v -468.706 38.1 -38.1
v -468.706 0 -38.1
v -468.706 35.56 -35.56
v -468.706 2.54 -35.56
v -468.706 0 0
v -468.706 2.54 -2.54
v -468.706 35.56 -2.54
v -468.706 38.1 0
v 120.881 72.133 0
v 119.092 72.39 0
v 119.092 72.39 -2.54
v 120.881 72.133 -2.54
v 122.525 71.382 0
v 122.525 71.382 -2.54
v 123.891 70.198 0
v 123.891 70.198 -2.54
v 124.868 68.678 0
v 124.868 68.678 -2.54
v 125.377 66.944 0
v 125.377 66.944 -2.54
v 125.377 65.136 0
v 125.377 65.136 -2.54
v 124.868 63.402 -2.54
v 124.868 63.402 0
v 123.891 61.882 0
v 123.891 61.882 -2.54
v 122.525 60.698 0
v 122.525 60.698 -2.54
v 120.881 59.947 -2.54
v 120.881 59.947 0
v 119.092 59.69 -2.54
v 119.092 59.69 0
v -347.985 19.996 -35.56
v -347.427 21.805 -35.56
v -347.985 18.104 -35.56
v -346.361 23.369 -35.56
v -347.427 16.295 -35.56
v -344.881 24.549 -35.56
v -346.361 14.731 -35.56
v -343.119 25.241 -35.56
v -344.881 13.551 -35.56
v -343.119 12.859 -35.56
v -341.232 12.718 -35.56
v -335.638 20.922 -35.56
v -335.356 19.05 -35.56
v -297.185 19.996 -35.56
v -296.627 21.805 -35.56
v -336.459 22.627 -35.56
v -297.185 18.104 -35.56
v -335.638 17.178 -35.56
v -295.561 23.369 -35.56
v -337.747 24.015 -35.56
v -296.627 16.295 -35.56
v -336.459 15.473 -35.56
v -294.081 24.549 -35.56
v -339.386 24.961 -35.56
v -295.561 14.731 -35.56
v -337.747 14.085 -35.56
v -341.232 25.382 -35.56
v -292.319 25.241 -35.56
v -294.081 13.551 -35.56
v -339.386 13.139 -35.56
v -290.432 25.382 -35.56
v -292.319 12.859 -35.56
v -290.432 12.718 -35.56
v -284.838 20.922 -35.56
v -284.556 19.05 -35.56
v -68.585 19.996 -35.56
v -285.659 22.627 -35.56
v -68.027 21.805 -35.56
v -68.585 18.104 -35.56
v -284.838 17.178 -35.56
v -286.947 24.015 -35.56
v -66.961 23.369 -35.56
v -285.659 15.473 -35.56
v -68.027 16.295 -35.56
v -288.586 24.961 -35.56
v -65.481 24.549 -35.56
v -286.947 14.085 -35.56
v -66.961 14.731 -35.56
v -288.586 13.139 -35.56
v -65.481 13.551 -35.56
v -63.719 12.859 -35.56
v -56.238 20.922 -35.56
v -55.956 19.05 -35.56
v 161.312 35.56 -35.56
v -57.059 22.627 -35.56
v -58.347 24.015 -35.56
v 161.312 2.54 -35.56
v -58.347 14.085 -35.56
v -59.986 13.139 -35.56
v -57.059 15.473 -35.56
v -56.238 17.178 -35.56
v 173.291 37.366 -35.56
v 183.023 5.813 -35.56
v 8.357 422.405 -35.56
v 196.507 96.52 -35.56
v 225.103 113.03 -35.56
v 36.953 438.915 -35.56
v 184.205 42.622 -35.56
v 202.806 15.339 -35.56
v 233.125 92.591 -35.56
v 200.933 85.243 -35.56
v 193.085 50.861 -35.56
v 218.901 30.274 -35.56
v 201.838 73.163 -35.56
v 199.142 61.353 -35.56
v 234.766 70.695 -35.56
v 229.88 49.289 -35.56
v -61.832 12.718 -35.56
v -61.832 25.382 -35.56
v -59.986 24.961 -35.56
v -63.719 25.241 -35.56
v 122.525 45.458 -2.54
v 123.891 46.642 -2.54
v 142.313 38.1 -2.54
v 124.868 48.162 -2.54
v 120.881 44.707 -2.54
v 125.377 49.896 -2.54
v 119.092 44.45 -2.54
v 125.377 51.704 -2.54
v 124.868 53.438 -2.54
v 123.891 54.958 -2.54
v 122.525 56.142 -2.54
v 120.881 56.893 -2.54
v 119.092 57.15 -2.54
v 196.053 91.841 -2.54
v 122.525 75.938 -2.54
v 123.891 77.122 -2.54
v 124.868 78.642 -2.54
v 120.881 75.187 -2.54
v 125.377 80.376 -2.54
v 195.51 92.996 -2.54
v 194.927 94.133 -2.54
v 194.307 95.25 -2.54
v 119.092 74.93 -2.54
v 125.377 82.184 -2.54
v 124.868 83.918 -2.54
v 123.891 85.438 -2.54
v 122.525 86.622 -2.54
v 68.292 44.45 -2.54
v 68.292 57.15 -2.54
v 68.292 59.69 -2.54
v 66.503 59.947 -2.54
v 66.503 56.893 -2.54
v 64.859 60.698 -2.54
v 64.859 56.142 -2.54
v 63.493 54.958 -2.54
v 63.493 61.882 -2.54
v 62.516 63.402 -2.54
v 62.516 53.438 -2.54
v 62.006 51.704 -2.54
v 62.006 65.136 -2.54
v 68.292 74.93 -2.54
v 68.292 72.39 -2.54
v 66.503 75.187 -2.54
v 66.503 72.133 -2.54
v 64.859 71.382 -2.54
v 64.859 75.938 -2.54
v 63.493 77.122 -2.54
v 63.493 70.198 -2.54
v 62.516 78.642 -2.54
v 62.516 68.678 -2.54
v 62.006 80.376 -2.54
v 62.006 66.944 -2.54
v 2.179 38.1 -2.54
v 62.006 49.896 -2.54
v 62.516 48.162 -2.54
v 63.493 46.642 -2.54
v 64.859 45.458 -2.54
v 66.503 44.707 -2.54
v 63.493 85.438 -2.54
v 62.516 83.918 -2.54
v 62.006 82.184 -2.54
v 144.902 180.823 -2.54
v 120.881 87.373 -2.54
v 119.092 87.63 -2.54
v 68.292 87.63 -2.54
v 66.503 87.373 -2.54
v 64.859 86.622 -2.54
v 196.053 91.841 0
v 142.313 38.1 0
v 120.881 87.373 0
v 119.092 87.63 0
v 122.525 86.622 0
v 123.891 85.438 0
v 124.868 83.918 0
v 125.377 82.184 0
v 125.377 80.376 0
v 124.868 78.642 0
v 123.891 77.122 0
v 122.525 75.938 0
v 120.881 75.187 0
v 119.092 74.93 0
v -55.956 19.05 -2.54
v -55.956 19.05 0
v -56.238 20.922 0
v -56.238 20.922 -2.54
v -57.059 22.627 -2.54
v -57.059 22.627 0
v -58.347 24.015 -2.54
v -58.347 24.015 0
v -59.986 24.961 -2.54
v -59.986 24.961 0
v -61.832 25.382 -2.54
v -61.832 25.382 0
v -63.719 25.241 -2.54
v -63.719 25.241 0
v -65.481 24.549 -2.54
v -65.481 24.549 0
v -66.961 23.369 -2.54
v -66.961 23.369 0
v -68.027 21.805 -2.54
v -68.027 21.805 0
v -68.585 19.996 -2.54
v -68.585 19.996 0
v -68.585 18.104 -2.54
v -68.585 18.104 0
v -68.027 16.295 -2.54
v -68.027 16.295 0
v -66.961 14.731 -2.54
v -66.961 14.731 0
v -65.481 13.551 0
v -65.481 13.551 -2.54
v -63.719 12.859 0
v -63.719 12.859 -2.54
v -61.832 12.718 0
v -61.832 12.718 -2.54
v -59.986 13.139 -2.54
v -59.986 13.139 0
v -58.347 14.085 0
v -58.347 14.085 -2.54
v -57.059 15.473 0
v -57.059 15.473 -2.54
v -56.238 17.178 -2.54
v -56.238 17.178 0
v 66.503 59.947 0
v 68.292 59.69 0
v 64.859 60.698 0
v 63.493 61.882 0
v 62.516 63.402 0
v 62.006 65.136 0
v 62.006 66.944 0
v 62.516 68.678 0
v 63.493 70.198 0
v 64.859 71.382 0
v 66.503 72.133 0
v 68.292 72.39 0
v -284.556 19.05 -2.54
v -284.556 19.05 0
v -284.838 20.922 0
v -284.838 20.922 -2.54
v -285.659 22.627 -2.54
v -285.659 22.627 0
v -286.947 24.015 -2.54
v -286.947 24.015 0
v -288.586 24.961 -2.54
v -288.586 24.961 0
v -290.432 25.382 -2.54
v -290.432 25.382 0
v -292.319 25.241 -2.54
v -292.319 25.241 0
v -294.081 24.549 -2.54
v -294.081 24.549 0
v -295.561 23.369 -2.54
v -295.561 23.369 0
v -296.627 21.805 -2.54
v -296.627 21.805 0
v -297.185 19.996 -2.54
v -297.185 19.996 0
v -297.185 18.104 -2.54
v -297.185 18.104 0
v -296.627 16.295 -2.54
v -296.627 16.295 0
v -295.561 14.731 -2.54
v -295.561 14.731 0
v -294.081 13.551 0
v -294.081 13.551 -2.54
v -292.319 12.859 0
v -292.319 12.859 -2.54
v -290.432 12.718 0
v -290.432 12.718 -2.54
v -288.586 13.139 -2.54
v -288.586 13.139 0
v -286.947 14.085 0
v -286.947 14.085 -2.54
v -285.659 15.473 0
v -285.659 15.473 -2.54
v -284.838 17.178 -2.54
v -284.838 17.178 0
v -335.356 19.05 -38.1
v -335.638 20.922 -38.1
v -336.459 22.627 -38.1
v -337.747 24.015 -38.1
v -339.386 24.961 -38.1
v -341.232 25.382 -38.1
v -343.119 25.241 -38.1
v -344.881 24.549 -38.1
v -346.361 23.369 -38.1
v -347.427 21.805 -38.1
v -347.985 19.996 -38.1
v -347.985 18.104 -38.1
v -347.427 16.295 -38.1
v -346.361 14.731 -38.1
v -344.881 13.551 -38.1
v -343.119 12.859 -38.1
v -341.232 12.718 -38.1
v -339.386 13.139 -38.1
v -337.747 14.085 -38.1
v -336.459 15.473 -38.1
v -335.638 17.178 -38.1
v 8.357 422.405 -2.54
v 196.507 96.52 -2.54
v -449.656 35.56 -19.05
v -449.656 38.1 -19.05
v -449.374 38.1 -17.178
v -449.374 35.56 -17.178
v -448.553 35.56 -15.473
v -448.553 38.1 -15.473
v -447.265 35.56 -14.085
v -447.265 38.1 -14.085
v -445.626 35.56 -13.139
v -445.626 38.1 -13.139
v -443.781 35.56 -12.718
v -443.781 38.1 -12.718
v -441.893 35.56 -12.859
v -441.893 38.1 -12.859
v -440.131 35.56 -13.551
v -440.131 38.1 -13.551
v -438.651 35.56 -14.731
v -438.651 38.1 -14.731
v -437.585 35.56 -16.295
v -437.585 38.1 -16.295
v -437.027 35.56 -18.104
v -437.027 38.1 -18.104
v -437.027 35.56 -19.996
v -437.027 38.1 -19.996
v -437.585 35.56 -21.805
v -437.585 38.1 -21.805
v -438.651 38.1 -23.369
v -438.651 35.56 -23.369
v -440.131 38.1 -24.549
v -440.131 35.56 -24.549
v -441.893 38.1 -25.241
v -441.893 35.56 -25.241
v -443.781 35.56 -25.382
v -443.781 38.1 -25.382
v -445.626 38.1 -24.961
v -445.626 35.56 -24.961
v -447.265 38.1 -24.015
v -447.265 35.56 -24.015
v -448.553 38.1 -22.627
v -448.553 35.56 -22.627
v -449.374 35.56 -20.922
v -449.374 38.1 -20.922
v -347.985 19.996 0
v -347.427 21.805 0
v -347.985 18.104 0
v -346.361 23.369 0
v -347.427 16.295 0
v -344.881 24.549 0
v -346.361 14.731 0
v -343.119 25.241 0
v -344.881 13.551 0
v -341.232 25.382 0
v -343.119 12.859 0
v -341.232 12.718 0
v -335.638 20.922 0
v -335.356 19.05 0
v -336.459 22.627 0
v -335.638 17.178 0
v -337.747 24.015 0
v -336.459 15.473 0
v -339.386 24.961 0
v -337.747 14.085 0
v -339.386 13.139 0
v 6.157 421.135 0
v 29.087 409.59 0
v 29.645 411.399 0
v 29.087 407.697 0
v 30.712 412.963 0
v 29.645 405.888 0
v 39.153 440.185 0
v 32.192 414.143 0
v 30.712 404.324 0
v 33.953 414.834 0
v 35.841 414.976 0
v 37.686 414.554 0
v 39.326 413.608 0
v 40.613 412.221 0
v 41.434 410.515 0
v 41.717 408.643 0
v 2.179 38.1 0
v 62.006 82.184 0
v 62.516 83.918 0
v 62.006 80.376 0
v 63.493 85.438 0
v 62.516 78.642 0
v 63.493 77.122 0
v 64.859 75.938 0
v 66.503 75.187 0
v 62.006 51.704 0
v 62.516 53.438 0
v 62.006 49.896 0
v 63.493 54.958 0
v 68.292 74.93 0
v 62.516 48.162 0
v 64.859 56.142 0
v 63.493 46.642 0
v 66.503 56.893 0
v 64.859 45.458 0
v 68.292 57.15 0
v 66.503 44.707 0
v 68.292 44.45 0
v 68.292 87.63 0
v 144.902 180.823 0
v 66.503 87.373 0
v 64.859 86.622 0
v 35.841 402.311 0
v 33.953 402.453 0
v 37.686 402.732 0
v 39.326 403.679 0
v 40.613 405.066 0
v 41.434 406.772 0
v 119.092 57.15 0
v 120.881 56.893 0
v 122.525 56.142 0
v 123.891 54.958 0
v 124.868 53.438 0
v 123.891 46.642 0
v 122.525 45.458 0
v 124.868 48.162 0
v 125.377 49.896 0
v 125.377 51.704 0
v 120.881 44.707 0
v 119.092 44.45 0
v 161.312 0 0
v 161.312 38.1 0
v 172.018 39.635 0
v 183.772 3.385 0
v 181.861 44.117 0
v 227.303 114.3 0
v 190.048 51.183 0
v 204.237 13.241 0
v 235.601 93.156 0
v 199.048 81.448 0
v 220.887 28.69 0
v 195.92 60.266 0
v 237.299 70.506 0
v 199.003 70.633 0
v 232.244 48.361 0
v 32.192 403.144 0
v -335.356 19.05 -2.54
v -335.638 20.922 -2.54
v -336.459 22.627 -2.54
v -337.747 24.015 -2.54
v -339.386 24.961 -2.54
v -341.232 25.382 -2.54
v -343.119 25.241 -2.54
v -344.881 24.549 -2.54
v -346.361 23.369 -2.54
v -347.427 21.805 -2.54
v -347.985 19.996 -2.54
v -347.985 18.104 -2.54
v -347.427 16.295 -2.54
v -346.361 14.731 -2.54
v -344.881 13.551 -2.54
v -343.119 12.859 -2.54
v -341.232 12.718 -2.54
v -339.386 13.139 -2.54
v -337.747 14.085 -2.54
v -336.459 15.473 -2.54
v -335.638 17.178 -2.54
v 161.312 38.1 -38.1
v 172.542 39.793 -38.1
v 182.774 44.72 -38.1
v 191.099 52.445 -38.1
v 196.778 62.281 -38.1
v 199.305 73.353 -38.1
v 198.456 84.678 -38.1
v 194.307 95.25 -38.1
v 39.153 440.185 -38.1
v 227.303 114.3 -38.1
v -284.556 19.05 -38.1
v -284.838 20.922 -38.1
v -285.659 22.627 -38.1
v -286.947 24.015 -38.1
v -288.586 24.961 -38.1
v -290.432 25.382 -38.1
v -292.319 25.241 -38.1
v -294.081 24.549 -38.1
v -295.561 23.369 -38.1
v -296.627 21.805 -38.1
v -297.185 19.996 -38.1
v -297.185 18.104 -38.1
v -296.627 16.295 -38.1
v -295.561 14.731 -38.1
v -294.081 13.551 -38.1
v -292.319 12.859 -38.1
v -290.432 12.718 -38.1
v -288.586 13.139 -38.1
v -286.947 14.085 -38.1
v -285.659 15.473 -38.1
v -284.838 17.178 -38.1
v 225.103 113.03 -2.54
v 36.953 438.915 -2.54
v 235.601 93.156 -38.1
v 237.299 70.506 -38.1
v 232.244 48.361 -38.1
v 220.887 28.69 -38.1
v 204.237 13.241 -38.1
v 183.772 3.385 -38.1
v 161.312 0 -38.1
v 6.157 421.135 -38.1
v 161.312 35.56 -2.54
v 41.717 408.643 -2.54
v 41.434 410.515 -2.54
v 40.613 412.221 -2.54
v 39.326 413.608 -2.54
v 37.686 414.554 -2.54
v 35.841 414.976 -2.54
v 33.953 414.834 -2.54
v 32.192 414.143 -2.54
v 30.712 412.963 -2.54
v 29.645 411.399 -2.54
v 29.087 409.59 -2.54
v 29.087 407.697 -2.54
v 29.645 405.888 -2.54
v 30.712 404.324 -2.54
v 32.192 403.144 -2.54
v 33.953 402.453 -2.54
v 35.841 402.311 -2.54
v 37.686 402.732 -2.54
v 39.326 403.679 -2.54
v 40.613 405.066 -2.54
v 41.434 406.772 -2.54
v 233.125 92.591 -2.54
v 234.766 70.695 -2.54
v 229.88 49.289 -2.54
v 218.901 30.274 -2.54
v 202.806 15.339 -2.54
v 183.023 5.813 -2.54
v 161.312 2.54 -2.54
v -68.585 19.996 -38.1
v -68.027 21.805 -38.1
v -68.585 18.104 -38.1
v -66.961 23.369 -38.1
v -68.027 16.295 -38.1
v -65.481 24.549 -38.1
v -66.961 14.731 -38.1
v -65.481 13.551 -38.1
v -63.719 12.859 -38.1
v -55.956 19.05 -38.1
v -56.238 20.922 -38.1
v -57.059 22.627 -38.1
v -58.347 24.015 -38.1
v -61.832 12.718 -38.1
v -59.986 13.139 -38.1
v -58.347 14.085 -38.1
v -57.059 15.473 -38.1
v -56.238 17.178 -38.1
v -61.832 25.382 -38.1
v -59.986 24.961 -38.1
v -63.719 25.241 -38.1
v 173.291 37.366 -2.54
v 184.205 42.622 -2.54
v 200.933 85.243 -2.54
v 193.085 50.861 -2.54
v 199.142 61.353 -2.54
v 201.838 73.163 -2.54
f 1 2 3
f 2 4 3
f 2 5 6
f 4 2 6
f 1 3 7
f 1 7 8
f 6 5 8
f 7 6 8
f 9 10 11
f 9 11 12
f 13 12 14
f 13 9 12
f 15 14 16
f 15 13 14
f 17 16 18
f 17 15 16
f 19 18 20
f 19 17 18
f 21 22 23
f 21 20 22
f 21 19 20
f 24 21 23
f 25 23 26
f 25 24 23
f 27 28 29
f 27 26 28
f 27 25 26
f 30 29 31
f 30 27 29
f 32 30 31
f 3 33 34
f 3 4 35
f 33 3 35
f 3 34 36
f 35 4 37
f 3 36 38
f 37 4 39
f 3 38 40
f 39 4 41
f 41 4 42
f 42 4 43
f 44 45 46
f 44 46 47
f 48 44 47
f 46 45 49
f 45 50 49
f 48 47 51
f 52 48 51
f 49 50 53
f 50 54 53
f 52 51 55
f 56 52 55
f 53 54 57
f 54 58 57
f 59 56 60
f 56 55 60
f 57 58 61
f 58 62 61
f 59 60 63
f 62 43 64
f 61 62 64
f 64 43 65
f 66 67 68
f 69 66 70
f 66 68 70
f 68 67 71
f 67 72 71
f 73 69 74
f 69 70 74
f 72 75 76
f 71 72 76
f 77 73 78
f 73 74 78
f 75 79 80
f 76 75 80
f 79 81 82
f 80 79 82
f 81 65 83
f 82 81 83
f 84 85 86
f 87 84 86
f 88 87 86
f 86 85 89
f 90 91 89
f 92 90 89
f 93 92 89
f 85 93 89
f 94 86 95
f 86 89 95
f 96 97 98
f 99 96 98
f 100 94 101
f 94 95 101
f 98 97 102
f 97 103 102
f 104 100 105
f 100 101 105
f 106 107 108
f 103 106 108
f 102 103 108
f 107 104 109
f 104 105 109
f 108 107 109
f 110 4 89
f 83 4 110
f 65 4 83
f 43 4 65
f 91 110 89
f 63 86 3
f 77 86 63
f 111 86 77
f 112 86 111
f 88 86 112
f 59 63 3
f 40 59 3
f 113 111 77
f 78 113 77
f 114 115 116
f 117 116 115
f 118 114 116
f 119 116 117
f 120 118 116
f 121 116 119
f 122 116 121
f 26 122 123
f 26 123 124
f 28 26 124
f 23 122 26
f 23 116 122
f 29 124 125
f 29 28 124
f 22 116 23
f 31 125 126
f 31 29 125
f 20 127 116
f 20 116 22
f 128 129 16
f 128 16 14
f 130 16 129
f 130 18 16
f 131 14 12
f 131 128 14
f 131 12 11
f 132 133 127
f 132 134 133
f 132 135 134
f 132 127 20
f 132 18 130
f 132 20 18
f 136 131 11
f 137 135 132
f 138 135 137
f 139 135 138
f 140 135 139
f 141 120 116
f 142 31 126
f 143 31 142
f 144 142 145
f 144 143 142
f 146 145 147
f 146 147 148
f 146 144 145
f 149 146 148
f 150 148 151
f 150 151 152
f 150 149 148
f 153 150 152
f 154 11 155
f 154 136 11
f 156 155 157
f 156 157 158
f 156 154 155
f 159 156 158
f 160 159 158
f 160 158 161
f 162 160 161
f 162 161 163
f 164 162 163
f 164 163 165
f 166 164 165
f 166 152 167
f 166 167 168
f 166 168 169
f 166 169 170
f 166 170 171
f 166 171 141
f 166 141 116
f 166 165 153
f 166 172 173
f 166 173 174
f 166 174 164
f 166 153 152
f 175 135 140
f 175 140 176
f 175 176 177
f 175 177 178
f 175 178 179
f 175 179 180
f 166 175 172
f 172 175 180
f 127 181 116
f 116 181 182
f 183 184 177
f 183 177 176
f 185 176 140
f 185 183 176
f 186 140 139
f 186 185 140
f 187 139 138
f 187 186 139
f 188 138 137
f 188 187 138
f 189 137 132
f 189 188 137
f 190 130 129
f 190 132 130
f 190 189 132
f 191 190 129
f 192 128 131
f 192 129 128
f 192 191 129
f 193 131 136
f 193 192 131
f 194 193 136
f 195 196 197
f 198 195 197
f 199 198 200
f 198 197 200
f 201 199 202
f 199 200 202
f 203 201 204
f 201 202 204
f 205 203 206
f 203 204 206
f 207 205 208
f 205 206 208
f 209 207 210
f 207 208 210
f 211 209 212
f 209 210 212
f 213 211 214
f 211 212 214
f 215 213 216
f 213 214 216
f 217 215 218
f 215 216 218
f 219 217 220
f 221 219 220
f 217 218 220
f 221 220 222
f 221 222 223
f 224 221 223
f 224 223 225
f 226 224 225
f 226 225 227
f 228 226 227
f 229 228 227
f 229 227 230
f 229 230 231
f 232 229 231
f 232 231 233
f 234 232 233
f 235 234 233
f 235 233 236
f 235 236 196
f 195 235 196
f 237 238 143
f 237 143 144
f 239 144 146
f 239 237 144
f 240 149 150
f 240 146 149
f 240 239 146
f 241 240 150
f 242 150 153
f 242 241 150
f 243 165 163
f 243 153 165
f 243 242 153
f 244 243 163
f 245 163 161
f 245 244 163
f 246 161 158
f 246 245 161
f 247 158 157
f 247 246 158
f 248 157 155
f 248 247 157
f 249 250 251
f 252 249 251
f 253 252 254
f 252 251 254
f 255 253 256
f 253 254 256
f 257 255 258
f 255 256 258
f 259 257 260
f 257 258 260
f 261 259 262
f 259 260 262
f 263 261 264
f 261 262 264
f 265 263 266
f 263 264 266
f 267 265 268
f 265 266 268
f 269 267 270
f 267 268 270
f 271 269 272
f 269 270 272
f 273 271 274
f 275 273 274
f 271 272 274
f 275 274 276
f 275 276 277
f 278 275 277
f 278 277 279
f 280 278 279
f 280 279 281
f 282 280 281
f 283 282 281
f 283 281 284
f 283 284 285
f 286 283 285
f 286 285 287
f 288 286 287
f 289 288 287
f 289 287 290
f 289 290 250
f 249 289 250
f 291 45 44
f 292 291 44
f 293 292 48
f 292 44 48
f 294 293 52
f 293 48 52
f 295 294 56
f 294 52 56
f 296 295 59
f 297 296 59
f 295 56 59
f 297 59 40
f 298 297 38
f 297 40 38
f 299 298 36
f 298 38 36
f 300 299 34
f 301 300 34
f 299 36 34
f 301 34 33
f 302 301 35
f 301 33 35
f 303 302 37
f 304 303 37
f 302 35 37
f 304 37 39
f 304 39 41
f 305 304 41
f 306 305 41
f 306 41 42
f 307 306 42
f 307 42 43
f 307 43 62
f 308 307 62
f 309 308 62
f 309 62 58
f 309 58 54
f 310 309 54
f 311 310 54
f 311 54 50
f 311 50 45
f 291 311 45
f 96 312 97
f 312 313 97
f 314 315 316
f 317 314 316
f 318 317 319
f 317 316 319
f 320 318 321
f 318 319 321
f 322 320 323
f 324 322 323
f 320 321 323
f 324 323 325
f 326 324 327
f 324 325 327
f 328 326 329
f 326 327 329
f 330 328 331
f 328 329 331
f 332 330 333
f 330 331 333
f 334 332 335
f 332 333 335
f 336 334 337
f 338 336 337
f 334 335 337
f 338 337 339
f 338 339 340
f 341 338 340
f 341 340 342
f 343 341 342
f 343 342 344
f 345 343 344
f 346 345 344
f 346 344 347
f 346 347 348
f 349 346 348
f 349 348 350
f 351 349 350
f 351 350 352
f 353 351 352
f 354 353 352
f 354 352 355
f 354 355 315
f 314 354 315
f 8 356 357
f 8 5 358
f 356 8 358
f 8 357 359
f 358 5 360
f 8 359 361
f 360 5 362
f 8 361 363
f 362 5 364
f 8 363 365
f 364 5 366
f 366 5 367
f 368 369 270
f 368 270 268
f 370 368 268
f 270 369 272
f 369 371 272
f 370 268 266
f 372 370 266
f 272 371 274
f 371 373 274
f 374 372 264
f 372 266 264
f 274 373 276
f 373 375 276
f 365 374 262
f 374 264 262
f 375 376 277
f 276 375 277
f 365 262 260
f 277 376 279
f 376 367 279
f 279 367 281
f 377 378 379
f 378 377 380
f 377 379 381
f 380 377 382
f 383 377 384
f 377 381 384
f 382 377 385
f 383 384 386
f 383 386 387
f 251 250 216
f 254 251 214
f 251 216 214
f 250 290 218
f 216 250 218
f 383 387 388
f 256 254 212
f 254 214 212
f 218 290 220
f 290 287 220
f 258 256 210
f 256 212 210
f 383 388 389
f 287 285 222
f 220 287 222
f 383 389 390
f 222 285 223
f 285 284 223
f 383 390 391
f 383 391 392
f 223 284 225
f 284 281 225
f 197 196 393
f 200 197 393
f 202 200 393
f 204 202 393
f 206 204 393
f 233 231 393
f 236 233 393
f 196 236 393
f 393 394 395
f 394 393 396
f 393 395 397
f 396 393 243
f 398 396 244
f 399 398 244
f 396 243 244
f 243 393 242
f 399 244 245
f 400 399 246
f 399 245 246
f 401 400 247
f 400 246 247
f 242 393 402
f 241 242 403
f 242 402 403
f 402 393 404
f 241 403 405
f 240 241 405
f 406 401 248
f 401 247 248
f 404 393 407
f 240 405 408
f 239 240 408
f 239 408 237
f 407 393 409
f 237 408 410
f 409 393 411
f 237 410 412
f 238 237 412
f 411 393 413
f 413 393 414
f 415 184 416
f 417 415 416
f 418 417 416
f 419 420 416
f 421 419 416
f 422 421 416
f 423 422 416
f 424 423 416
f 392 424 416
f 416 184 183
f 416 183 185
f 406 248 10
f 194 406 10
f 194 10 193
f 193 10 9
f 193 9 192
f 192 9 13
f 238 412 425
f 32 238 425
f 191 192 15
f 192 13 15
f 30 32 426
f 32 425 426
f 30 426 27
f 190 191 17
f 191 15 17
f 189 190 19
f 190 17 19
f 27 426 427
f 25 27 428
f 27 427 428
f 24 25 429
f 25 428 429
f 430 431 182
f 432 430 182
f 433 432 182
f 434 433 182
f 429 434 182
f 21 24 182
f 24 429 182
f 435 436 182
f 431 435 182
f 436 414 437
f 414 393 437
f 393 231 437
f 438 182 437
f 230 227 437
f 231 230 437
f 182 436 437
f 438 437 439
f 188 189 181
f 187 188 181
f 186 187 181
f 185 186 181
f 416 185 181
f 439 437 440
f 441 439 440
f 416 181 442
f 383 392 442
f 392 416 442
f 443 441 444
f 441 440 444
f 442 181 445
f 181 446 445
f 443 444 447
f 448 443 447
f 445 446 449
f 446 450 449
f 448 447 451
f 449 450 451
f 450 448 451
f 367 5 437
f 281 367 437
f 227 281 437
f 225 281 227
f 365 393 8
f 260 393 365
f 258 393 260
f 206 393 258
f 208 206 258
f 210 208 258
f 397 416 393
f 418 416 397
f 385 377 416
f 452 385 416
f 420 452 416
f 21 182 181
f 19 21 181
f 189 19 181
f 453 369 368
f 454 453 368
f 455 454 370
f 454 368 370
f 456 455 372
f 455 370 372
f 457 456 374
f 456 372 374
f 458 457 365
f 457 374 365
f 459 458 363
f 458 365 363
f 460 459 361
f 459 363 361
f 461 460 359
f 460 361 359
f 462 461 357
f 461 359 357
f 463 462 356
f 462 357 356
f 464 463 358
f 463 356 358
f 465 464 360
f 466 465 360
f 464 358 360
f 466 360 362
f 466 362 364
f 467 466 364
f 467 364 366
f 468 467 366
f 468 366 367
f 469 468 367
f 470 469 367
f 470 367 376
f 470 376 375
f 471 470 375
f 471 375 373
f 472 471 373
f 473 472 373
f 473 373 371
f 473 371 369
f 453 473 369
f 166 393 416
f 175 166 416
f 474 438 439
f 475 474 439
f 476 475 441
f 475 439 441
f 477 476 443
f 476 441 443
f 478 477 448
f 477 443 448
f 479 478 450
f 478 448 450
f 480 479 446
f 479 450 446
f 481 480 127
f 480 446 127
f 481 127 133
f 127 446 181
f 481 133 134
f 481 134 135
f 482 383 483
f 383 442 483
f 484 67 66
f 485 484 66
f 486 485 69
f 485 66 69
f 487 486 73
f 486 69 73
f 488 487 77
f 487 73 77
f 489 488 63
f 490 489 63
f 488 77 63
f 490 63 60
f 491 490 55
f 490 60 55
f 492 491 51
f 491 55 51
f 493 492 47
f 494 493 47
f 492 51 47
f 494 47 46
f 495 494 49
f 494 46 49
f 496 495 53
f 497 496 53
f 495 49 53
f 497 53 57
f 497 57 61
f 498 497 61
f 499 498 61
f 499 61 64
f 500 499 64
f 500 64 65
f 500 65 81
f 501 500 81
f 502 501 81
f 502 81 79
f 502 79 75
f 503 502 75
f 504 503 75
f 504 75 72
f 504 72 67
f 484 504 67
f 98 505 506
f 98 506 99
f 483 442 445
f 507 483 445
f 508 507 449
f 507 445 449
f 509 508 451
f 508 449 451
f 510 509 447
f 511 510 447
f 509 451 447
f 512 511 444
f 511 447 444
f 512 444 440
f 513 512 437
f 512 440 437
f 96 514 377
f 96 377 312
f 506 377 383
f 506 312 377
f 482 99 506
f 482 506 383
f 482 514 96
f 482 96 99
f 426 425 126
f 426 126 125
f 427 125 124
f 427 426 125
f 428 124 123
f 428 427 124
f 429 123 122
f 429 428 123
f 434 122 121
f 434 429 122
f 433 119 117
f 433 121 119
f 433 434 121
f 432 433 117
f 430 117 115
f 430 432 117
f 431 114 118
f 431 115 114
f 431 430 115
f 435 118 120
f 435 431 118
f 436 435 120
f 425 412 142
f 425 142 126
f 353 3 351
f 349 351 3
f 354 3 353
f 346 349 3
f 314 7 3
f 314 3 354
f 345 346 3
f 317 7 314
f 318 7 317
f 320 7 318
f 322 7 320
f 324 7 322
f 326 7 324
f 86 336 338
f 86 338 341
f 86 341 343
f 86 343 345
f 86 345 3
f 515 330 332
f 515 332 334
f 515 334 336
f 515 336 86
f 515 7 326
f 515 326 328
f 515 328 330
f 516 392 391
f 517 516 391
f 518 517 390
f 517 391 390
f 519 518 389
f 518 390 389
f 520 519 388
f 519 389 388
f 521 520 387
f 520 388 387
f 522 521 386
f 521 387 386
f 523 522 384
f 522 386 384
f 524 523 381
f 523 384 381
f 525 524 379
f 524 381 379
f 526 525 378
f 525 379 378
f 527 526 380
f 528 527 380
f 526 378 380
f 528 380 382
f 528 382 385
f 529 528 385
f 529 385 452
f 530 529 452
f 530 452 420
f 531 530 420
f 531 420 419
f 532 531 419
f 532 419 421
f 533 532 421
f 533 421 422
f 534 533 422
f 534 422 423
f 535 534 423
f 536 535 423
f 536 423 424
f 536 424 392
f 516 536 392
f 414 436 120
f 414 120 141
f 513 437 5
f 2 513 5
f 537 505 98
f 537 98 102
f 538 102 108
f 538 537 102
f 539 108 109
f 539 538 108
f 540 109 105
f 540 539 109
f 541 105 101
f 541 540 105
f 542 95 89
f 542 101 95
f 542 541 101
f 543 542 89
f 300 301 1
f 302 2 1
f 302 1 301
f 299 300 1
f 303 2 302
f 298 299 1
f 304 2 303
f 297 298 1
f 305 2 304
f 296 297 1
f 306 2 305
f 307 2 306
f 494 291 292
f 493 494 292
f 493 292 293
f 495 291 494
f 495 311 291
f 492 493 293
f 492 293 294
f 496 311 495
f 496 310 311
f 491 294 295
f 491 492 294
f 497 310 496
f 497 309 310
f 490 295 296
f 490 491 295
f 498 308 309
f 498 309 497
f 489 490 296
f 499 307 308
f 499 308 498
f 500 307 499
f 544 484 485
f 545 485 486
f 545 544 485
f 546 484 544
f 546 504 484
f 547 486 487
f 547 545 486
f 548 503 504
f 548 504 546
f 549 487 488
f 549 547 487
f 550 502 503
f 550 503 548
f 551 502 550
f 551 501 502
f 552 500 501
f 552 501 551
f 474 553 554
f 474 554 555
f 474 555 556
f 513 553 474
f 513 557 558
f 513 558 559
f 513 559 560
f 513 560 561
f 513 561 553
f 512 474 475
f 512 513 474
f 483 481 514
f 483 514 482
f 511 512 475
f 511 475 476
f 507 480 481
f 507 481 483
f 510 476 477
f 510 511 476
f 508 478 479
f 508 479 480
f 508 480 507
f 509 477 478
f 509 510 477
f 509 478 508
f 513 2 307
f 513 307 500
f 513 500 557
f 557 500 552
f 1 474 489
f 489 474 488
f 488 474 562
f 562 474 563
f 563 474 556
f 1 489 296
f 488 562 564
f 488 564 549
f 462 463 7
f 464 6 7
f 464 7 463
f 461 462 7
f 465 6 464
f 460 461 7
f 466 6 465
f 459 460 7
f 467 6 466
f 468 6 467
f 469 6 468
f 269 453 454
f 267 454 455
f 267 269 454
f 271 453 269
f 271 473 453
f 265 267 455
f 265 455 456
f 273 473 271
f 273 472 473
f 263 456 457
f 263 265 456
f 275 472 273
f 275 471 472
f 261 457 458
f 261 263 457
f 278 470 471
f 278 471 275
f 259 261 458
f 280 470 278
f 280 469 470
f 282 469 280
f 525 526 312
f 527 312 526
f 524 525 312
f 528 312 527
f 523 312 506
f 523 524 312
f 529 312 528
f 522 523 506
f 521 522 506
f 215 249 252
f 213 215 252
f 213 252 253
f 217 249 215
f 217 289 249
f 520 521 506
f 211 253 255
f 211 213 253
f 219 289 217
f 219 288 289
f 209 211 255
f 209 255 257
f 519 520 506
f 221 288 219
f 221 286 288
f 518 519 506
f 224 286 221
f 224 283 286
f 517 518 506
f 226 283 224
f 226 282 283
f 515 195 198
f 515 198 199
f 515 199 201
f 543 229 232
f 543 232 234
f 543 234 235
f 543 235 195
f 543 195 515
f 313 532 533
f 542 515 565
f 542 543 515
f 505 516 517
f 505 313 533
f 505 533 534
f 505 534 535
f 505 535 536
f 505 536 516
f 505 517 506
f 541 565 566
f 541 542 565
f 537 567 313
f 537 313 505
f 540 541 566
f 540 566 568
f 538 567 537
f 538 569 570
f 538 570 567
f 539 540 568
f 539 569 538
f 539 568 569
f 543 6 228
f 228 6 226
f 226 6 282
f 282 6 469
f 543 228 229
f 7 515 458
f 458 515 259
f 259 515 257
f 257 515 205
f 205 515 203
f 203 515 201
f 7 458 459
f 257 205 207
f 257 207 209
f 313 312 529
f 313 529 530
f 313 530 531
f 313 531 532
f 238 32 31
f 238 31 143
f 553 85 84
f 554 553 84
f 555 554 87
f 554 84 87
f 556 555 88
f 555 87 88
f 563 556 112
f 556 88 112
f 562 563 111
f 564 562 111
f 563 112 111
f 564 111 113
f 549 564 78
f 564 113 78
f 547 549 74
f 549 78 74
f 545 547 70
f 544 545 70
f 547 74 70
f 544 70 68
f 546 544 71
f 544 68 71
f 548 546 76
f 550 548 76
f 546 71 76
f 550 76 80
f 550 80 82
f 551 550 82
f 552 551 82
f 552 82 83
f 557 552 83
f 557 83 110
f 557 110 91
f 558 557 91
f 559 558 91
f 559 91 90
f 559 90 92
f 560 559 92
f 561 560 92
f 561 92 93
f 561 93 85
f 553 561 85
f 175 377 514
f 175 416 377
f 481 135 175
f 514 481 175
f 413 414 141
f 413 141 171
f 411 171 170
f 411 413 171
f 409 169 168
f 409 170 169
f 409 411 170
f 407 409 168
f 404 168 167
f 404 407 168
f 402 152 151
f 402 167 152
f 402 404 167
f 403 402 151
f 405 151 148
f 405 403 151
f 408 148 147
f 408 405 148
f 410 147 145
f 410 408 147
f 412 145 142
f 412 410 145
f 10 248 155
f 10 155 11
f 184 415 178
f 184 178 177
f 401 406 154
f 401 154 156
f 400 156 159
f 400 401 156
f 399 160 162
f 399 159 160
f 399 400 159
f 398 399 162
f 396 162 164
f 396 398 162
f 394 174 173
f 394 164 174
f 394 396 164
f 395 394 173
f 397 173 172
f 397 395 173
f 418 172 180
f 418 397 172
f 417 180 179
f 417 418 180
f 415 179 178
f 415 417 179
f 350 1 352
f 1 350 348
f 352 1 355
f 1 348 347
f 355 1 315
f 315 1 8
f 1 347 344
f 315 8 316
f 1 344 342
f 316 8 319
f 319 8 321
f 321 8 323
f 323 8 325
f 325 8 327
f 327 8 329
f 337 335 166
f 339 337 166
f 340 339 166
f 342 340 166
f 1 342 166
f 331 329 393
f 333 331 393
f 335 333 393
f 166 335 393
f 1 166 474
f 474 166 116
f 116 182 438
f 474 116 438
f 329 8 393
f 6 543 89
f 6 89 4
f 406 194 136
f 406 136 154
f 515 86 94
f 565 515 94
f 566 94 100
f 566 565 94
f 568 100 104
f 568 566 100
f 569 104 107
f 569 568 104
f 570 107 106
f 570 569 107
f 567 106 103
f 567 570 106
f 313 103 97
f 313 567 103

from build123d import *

# Parameters (mm, degrees)
BOSS_EXTRUDE1_DEPTH     = 38.1
SHELL1_T                = -2.54
CUT_EXTRUDE1_REACH      = 782.53
SKETCH3_W               = 33.02
SKETCH3_H               = 33.02
BOSS_EXTRUDE2_DEPTH     = 2.54
SKETCH5_R               = 6.35
CUT_EXTRUDE2_DEPTH      = 575.603362093
SKETCH7_W               = 38.1
SKETCH7_H               = 38.1
SKETCH7_W_2             = 33.02
SKETCH7_H_2             = 33.02
BOSS_EXTRUDE3_DEPTH     = 127
CUT_EXTRUDE4_REACH      = 620.716
SKETCH8_R               = 6.35
CUT_EXTRUDE6_DEPTH      = 644.98208109
CUT_EXTRUDE6_DEPTH_BACK = 644.98208109
CUT_EXTRUDE7_REACH      = 646.127
SKETCH11_R              = 6.35


with BuildPart() as part:
    # Sketch1 → Boss-Extrude1 (new body)
    with BuildSketch(Plane.XY):
        with BuildLine():
            Line((102.652877862, 330.2), (227.30280098, 114.3))
            ThreePointArc((227.30280098, 114.3), (227.30280098, 38.1), (161.311665212, 0))
            Line((161.311665212, 0), (-468.706063252, 0))
            Line((-468.706063252, 0), (-468.706063252, 38.1))
            Line((-468.706063252, 38.1), (161.311665212, 38.1))
            ThreePointArc((161.311665212, 38.1), (194.307233096, 57.15), (194.307233096, 95.25))
            Line((194.307233096, 95.25), (69.657309978, 311.15))
            Line((69.657309978, 311.15), (102.652877862, 330.2))
        make_face()
    extrude(amount=-BOSS_EXTRUDE1_DEPTH)

    # Shell1
    shell1_openings = [part.faces().sort_by_distance(p)[0] for p in [
        (86.15509392, 320.675, -19.05),
    ]]
    offset(amount=SHELL1_T, openings=shell1_openings, kind=Kind.INTERSECTION)

    # Sketch3 → Cut-Extrude1 (cut, up to next)
    with BuildSketch(Plane.ZY.offset(468.706063252), mode=Mode.PRIVATE) as cut_extrude1_sk1:
        with Locations((-19.05, 19.05)):
            Rectangle(SKETCH3_W, SKETCH3_H)
    cut_extrude1_tool1 = extrude(cut_extrude1_sk1.sketch, amount=-CUT_EXTRUDE1_REACH, mode=Mode.PRIVATE) & part.part
    add(cut_extrude1_tool1.solids().sort_by_distance((-468.706063, 19.05, -19.05))[0], mode=Mode.SUBTRACT)

    # Sketch4 → Boss-Extrude2 (add)
    with BuildSketch(Plane.XY):
        Polygon((2.178975516, 38.1), (144.901761863, 180.822786347), (196.194281247, 91.981536726), (142.31274452, 38.1), align=None)
    extrude(amount=-BOSS_EXTRUDE2_DEPTH)

    # Sketch5 → Cut-Extrude2 (cut, through all)
    with BuildSketch(Plane.XY):
        with Locations((-62.306063252, 19.05)):
            Circle(SKETCH5_R)
        with Locations((-290.906063252, 19.05)):
            Circle(SKETCH5_R)
        with Locations((-341.706063252, 19.05)):
            Circle(SKETCH5_R)
    extrude(amount=-CUT_EXTRUDE2_DEPTH, mode=Mode.SUBTRACT)

    # Sketch7 → Boss-Extrude3 (add)
    with BuildSketch(Plane(origin=(-117.317574699, 203.2, 0), x_dir=(0.8660254037844362, 0.5000000000000044, 0), z_dir=(-0.5000000000000044, 0.8660254037844362, 0))):
        with Locations((234.95, 19.05)):
            Rectangle(SKETCH7_W, SKETCH7_H)
        with Locations((234.95, 19.05)):
            Rectangle(SKETCH7_W_2, SKETCH7_H_2, mode=Mode.SUBTRACT)
    extrude(amount=BOSS_EXTRUDE3_DEPTH)

    # Sketch8 → Cut-Extrude4 (cut, up to next)
    with BuildSketch(Plane(origin=(0, 38.1, 0), x_dir=(1, 0, 0), z_dir=(0, 1, 0)), mode=Mode.PRIVATE) as cut_extrude4_sk1:
        with Locations(Location((-443.306063252, 19.05, 0), (0, 0, 180))):
            Circle(SKETCH8_R)
    cut_extrude4_tool1 = extrude(cut_extrude4_sk1.sketch, amount=-CUT_EXTRUDE4_REACH, mode=Mode.PRIVATE) & part.part
    add(cut_extrude4_tool1.solids().sort_by_distance((-443.306063, 38.1, -19.05))[0], mode=Mode.SUBTRACT)

    # Sketch10 → Cut-Extrude6 (cut, two sides: drawn at the far end of the back side and taken through both)
    with BuildSketch(Plane(origin=(0, 0, -2.54), x_dir=(-1, 0, 0), z_dir=(0, 0, -1)).offset(-CUT_EXTRUDE6_DEPTH_BACK)):
        with BuildLine():
            Line((-68.291720036, 57.15), (-119.091720036, 57.15))
            ThreePointArc((-119.091720036, 57.15), (-125.441720036, 50.8), (-119.091720036, 44.45))
            Line((-119.091720036, 44.45), (-68.291720036, 44.45))
            ThreePointArc((-68.291720036, 44.45), (-61.941720036, 50.8), (-68.291720036, 57.15))
        make_face()
        with BuildLine():
            Line((-68.291720036, 72.39), (-119.091720036, 72.39))
            ThreePointArc((-119.091720036, 72.39), (-125.441720036, 66.04), (-119.091720036, 59.69))
            Line((-119.091720036, 59.69), (-68.291720036, 59.69))
            ThreePointArc((-68.291720036, 59.69), (-61.941720036, 66.04), (-68.291720036, 72.39))
        make_face()
        with BuildLine():
            Line((-68.291720036, 87.63), (-119.091720036, 87.63))
            ThreePointArc((-119.091720036, 87.63), (-125.441720036, 81.28), (-119.091720036, 74.93))
            Line((-119.091720036, 74.93), (-68.291720036, 74.93))
            ThreePointArc((-68.291720036, 74.93), (-61.941720036, 81.28), (-68.291720036, 87.63))
        make_face()
    extrude(amount=CUT_EXTRUDE6_DEPTH + CUT_EXTRUDE6_DEPTH_BACK, mode=Mode.SUBTRACT)

    # Sketch11 → Cut-Extrude7 (cut, up to next)
    with BuildSketch(Plane.XY, mode=Mode.PRIVATE) as cut_extrude7_sk1:
        with Locations((35.366501125, 408.643423165)):
            Circle(SKETCH11_R)
    cut_extrude7_tool1 = extrude(cut_extrude7_sk1.sketch, amount=-CUT_EXTRUDE7_REACH, mode=Mode.PRIVATE) & part.part
    add(cut_extrude7_tool1.solids().sort_by_distance((35.366501, 408.643423, 0))[0], mode=Mode.SUBTRACT)


solid = part.part
